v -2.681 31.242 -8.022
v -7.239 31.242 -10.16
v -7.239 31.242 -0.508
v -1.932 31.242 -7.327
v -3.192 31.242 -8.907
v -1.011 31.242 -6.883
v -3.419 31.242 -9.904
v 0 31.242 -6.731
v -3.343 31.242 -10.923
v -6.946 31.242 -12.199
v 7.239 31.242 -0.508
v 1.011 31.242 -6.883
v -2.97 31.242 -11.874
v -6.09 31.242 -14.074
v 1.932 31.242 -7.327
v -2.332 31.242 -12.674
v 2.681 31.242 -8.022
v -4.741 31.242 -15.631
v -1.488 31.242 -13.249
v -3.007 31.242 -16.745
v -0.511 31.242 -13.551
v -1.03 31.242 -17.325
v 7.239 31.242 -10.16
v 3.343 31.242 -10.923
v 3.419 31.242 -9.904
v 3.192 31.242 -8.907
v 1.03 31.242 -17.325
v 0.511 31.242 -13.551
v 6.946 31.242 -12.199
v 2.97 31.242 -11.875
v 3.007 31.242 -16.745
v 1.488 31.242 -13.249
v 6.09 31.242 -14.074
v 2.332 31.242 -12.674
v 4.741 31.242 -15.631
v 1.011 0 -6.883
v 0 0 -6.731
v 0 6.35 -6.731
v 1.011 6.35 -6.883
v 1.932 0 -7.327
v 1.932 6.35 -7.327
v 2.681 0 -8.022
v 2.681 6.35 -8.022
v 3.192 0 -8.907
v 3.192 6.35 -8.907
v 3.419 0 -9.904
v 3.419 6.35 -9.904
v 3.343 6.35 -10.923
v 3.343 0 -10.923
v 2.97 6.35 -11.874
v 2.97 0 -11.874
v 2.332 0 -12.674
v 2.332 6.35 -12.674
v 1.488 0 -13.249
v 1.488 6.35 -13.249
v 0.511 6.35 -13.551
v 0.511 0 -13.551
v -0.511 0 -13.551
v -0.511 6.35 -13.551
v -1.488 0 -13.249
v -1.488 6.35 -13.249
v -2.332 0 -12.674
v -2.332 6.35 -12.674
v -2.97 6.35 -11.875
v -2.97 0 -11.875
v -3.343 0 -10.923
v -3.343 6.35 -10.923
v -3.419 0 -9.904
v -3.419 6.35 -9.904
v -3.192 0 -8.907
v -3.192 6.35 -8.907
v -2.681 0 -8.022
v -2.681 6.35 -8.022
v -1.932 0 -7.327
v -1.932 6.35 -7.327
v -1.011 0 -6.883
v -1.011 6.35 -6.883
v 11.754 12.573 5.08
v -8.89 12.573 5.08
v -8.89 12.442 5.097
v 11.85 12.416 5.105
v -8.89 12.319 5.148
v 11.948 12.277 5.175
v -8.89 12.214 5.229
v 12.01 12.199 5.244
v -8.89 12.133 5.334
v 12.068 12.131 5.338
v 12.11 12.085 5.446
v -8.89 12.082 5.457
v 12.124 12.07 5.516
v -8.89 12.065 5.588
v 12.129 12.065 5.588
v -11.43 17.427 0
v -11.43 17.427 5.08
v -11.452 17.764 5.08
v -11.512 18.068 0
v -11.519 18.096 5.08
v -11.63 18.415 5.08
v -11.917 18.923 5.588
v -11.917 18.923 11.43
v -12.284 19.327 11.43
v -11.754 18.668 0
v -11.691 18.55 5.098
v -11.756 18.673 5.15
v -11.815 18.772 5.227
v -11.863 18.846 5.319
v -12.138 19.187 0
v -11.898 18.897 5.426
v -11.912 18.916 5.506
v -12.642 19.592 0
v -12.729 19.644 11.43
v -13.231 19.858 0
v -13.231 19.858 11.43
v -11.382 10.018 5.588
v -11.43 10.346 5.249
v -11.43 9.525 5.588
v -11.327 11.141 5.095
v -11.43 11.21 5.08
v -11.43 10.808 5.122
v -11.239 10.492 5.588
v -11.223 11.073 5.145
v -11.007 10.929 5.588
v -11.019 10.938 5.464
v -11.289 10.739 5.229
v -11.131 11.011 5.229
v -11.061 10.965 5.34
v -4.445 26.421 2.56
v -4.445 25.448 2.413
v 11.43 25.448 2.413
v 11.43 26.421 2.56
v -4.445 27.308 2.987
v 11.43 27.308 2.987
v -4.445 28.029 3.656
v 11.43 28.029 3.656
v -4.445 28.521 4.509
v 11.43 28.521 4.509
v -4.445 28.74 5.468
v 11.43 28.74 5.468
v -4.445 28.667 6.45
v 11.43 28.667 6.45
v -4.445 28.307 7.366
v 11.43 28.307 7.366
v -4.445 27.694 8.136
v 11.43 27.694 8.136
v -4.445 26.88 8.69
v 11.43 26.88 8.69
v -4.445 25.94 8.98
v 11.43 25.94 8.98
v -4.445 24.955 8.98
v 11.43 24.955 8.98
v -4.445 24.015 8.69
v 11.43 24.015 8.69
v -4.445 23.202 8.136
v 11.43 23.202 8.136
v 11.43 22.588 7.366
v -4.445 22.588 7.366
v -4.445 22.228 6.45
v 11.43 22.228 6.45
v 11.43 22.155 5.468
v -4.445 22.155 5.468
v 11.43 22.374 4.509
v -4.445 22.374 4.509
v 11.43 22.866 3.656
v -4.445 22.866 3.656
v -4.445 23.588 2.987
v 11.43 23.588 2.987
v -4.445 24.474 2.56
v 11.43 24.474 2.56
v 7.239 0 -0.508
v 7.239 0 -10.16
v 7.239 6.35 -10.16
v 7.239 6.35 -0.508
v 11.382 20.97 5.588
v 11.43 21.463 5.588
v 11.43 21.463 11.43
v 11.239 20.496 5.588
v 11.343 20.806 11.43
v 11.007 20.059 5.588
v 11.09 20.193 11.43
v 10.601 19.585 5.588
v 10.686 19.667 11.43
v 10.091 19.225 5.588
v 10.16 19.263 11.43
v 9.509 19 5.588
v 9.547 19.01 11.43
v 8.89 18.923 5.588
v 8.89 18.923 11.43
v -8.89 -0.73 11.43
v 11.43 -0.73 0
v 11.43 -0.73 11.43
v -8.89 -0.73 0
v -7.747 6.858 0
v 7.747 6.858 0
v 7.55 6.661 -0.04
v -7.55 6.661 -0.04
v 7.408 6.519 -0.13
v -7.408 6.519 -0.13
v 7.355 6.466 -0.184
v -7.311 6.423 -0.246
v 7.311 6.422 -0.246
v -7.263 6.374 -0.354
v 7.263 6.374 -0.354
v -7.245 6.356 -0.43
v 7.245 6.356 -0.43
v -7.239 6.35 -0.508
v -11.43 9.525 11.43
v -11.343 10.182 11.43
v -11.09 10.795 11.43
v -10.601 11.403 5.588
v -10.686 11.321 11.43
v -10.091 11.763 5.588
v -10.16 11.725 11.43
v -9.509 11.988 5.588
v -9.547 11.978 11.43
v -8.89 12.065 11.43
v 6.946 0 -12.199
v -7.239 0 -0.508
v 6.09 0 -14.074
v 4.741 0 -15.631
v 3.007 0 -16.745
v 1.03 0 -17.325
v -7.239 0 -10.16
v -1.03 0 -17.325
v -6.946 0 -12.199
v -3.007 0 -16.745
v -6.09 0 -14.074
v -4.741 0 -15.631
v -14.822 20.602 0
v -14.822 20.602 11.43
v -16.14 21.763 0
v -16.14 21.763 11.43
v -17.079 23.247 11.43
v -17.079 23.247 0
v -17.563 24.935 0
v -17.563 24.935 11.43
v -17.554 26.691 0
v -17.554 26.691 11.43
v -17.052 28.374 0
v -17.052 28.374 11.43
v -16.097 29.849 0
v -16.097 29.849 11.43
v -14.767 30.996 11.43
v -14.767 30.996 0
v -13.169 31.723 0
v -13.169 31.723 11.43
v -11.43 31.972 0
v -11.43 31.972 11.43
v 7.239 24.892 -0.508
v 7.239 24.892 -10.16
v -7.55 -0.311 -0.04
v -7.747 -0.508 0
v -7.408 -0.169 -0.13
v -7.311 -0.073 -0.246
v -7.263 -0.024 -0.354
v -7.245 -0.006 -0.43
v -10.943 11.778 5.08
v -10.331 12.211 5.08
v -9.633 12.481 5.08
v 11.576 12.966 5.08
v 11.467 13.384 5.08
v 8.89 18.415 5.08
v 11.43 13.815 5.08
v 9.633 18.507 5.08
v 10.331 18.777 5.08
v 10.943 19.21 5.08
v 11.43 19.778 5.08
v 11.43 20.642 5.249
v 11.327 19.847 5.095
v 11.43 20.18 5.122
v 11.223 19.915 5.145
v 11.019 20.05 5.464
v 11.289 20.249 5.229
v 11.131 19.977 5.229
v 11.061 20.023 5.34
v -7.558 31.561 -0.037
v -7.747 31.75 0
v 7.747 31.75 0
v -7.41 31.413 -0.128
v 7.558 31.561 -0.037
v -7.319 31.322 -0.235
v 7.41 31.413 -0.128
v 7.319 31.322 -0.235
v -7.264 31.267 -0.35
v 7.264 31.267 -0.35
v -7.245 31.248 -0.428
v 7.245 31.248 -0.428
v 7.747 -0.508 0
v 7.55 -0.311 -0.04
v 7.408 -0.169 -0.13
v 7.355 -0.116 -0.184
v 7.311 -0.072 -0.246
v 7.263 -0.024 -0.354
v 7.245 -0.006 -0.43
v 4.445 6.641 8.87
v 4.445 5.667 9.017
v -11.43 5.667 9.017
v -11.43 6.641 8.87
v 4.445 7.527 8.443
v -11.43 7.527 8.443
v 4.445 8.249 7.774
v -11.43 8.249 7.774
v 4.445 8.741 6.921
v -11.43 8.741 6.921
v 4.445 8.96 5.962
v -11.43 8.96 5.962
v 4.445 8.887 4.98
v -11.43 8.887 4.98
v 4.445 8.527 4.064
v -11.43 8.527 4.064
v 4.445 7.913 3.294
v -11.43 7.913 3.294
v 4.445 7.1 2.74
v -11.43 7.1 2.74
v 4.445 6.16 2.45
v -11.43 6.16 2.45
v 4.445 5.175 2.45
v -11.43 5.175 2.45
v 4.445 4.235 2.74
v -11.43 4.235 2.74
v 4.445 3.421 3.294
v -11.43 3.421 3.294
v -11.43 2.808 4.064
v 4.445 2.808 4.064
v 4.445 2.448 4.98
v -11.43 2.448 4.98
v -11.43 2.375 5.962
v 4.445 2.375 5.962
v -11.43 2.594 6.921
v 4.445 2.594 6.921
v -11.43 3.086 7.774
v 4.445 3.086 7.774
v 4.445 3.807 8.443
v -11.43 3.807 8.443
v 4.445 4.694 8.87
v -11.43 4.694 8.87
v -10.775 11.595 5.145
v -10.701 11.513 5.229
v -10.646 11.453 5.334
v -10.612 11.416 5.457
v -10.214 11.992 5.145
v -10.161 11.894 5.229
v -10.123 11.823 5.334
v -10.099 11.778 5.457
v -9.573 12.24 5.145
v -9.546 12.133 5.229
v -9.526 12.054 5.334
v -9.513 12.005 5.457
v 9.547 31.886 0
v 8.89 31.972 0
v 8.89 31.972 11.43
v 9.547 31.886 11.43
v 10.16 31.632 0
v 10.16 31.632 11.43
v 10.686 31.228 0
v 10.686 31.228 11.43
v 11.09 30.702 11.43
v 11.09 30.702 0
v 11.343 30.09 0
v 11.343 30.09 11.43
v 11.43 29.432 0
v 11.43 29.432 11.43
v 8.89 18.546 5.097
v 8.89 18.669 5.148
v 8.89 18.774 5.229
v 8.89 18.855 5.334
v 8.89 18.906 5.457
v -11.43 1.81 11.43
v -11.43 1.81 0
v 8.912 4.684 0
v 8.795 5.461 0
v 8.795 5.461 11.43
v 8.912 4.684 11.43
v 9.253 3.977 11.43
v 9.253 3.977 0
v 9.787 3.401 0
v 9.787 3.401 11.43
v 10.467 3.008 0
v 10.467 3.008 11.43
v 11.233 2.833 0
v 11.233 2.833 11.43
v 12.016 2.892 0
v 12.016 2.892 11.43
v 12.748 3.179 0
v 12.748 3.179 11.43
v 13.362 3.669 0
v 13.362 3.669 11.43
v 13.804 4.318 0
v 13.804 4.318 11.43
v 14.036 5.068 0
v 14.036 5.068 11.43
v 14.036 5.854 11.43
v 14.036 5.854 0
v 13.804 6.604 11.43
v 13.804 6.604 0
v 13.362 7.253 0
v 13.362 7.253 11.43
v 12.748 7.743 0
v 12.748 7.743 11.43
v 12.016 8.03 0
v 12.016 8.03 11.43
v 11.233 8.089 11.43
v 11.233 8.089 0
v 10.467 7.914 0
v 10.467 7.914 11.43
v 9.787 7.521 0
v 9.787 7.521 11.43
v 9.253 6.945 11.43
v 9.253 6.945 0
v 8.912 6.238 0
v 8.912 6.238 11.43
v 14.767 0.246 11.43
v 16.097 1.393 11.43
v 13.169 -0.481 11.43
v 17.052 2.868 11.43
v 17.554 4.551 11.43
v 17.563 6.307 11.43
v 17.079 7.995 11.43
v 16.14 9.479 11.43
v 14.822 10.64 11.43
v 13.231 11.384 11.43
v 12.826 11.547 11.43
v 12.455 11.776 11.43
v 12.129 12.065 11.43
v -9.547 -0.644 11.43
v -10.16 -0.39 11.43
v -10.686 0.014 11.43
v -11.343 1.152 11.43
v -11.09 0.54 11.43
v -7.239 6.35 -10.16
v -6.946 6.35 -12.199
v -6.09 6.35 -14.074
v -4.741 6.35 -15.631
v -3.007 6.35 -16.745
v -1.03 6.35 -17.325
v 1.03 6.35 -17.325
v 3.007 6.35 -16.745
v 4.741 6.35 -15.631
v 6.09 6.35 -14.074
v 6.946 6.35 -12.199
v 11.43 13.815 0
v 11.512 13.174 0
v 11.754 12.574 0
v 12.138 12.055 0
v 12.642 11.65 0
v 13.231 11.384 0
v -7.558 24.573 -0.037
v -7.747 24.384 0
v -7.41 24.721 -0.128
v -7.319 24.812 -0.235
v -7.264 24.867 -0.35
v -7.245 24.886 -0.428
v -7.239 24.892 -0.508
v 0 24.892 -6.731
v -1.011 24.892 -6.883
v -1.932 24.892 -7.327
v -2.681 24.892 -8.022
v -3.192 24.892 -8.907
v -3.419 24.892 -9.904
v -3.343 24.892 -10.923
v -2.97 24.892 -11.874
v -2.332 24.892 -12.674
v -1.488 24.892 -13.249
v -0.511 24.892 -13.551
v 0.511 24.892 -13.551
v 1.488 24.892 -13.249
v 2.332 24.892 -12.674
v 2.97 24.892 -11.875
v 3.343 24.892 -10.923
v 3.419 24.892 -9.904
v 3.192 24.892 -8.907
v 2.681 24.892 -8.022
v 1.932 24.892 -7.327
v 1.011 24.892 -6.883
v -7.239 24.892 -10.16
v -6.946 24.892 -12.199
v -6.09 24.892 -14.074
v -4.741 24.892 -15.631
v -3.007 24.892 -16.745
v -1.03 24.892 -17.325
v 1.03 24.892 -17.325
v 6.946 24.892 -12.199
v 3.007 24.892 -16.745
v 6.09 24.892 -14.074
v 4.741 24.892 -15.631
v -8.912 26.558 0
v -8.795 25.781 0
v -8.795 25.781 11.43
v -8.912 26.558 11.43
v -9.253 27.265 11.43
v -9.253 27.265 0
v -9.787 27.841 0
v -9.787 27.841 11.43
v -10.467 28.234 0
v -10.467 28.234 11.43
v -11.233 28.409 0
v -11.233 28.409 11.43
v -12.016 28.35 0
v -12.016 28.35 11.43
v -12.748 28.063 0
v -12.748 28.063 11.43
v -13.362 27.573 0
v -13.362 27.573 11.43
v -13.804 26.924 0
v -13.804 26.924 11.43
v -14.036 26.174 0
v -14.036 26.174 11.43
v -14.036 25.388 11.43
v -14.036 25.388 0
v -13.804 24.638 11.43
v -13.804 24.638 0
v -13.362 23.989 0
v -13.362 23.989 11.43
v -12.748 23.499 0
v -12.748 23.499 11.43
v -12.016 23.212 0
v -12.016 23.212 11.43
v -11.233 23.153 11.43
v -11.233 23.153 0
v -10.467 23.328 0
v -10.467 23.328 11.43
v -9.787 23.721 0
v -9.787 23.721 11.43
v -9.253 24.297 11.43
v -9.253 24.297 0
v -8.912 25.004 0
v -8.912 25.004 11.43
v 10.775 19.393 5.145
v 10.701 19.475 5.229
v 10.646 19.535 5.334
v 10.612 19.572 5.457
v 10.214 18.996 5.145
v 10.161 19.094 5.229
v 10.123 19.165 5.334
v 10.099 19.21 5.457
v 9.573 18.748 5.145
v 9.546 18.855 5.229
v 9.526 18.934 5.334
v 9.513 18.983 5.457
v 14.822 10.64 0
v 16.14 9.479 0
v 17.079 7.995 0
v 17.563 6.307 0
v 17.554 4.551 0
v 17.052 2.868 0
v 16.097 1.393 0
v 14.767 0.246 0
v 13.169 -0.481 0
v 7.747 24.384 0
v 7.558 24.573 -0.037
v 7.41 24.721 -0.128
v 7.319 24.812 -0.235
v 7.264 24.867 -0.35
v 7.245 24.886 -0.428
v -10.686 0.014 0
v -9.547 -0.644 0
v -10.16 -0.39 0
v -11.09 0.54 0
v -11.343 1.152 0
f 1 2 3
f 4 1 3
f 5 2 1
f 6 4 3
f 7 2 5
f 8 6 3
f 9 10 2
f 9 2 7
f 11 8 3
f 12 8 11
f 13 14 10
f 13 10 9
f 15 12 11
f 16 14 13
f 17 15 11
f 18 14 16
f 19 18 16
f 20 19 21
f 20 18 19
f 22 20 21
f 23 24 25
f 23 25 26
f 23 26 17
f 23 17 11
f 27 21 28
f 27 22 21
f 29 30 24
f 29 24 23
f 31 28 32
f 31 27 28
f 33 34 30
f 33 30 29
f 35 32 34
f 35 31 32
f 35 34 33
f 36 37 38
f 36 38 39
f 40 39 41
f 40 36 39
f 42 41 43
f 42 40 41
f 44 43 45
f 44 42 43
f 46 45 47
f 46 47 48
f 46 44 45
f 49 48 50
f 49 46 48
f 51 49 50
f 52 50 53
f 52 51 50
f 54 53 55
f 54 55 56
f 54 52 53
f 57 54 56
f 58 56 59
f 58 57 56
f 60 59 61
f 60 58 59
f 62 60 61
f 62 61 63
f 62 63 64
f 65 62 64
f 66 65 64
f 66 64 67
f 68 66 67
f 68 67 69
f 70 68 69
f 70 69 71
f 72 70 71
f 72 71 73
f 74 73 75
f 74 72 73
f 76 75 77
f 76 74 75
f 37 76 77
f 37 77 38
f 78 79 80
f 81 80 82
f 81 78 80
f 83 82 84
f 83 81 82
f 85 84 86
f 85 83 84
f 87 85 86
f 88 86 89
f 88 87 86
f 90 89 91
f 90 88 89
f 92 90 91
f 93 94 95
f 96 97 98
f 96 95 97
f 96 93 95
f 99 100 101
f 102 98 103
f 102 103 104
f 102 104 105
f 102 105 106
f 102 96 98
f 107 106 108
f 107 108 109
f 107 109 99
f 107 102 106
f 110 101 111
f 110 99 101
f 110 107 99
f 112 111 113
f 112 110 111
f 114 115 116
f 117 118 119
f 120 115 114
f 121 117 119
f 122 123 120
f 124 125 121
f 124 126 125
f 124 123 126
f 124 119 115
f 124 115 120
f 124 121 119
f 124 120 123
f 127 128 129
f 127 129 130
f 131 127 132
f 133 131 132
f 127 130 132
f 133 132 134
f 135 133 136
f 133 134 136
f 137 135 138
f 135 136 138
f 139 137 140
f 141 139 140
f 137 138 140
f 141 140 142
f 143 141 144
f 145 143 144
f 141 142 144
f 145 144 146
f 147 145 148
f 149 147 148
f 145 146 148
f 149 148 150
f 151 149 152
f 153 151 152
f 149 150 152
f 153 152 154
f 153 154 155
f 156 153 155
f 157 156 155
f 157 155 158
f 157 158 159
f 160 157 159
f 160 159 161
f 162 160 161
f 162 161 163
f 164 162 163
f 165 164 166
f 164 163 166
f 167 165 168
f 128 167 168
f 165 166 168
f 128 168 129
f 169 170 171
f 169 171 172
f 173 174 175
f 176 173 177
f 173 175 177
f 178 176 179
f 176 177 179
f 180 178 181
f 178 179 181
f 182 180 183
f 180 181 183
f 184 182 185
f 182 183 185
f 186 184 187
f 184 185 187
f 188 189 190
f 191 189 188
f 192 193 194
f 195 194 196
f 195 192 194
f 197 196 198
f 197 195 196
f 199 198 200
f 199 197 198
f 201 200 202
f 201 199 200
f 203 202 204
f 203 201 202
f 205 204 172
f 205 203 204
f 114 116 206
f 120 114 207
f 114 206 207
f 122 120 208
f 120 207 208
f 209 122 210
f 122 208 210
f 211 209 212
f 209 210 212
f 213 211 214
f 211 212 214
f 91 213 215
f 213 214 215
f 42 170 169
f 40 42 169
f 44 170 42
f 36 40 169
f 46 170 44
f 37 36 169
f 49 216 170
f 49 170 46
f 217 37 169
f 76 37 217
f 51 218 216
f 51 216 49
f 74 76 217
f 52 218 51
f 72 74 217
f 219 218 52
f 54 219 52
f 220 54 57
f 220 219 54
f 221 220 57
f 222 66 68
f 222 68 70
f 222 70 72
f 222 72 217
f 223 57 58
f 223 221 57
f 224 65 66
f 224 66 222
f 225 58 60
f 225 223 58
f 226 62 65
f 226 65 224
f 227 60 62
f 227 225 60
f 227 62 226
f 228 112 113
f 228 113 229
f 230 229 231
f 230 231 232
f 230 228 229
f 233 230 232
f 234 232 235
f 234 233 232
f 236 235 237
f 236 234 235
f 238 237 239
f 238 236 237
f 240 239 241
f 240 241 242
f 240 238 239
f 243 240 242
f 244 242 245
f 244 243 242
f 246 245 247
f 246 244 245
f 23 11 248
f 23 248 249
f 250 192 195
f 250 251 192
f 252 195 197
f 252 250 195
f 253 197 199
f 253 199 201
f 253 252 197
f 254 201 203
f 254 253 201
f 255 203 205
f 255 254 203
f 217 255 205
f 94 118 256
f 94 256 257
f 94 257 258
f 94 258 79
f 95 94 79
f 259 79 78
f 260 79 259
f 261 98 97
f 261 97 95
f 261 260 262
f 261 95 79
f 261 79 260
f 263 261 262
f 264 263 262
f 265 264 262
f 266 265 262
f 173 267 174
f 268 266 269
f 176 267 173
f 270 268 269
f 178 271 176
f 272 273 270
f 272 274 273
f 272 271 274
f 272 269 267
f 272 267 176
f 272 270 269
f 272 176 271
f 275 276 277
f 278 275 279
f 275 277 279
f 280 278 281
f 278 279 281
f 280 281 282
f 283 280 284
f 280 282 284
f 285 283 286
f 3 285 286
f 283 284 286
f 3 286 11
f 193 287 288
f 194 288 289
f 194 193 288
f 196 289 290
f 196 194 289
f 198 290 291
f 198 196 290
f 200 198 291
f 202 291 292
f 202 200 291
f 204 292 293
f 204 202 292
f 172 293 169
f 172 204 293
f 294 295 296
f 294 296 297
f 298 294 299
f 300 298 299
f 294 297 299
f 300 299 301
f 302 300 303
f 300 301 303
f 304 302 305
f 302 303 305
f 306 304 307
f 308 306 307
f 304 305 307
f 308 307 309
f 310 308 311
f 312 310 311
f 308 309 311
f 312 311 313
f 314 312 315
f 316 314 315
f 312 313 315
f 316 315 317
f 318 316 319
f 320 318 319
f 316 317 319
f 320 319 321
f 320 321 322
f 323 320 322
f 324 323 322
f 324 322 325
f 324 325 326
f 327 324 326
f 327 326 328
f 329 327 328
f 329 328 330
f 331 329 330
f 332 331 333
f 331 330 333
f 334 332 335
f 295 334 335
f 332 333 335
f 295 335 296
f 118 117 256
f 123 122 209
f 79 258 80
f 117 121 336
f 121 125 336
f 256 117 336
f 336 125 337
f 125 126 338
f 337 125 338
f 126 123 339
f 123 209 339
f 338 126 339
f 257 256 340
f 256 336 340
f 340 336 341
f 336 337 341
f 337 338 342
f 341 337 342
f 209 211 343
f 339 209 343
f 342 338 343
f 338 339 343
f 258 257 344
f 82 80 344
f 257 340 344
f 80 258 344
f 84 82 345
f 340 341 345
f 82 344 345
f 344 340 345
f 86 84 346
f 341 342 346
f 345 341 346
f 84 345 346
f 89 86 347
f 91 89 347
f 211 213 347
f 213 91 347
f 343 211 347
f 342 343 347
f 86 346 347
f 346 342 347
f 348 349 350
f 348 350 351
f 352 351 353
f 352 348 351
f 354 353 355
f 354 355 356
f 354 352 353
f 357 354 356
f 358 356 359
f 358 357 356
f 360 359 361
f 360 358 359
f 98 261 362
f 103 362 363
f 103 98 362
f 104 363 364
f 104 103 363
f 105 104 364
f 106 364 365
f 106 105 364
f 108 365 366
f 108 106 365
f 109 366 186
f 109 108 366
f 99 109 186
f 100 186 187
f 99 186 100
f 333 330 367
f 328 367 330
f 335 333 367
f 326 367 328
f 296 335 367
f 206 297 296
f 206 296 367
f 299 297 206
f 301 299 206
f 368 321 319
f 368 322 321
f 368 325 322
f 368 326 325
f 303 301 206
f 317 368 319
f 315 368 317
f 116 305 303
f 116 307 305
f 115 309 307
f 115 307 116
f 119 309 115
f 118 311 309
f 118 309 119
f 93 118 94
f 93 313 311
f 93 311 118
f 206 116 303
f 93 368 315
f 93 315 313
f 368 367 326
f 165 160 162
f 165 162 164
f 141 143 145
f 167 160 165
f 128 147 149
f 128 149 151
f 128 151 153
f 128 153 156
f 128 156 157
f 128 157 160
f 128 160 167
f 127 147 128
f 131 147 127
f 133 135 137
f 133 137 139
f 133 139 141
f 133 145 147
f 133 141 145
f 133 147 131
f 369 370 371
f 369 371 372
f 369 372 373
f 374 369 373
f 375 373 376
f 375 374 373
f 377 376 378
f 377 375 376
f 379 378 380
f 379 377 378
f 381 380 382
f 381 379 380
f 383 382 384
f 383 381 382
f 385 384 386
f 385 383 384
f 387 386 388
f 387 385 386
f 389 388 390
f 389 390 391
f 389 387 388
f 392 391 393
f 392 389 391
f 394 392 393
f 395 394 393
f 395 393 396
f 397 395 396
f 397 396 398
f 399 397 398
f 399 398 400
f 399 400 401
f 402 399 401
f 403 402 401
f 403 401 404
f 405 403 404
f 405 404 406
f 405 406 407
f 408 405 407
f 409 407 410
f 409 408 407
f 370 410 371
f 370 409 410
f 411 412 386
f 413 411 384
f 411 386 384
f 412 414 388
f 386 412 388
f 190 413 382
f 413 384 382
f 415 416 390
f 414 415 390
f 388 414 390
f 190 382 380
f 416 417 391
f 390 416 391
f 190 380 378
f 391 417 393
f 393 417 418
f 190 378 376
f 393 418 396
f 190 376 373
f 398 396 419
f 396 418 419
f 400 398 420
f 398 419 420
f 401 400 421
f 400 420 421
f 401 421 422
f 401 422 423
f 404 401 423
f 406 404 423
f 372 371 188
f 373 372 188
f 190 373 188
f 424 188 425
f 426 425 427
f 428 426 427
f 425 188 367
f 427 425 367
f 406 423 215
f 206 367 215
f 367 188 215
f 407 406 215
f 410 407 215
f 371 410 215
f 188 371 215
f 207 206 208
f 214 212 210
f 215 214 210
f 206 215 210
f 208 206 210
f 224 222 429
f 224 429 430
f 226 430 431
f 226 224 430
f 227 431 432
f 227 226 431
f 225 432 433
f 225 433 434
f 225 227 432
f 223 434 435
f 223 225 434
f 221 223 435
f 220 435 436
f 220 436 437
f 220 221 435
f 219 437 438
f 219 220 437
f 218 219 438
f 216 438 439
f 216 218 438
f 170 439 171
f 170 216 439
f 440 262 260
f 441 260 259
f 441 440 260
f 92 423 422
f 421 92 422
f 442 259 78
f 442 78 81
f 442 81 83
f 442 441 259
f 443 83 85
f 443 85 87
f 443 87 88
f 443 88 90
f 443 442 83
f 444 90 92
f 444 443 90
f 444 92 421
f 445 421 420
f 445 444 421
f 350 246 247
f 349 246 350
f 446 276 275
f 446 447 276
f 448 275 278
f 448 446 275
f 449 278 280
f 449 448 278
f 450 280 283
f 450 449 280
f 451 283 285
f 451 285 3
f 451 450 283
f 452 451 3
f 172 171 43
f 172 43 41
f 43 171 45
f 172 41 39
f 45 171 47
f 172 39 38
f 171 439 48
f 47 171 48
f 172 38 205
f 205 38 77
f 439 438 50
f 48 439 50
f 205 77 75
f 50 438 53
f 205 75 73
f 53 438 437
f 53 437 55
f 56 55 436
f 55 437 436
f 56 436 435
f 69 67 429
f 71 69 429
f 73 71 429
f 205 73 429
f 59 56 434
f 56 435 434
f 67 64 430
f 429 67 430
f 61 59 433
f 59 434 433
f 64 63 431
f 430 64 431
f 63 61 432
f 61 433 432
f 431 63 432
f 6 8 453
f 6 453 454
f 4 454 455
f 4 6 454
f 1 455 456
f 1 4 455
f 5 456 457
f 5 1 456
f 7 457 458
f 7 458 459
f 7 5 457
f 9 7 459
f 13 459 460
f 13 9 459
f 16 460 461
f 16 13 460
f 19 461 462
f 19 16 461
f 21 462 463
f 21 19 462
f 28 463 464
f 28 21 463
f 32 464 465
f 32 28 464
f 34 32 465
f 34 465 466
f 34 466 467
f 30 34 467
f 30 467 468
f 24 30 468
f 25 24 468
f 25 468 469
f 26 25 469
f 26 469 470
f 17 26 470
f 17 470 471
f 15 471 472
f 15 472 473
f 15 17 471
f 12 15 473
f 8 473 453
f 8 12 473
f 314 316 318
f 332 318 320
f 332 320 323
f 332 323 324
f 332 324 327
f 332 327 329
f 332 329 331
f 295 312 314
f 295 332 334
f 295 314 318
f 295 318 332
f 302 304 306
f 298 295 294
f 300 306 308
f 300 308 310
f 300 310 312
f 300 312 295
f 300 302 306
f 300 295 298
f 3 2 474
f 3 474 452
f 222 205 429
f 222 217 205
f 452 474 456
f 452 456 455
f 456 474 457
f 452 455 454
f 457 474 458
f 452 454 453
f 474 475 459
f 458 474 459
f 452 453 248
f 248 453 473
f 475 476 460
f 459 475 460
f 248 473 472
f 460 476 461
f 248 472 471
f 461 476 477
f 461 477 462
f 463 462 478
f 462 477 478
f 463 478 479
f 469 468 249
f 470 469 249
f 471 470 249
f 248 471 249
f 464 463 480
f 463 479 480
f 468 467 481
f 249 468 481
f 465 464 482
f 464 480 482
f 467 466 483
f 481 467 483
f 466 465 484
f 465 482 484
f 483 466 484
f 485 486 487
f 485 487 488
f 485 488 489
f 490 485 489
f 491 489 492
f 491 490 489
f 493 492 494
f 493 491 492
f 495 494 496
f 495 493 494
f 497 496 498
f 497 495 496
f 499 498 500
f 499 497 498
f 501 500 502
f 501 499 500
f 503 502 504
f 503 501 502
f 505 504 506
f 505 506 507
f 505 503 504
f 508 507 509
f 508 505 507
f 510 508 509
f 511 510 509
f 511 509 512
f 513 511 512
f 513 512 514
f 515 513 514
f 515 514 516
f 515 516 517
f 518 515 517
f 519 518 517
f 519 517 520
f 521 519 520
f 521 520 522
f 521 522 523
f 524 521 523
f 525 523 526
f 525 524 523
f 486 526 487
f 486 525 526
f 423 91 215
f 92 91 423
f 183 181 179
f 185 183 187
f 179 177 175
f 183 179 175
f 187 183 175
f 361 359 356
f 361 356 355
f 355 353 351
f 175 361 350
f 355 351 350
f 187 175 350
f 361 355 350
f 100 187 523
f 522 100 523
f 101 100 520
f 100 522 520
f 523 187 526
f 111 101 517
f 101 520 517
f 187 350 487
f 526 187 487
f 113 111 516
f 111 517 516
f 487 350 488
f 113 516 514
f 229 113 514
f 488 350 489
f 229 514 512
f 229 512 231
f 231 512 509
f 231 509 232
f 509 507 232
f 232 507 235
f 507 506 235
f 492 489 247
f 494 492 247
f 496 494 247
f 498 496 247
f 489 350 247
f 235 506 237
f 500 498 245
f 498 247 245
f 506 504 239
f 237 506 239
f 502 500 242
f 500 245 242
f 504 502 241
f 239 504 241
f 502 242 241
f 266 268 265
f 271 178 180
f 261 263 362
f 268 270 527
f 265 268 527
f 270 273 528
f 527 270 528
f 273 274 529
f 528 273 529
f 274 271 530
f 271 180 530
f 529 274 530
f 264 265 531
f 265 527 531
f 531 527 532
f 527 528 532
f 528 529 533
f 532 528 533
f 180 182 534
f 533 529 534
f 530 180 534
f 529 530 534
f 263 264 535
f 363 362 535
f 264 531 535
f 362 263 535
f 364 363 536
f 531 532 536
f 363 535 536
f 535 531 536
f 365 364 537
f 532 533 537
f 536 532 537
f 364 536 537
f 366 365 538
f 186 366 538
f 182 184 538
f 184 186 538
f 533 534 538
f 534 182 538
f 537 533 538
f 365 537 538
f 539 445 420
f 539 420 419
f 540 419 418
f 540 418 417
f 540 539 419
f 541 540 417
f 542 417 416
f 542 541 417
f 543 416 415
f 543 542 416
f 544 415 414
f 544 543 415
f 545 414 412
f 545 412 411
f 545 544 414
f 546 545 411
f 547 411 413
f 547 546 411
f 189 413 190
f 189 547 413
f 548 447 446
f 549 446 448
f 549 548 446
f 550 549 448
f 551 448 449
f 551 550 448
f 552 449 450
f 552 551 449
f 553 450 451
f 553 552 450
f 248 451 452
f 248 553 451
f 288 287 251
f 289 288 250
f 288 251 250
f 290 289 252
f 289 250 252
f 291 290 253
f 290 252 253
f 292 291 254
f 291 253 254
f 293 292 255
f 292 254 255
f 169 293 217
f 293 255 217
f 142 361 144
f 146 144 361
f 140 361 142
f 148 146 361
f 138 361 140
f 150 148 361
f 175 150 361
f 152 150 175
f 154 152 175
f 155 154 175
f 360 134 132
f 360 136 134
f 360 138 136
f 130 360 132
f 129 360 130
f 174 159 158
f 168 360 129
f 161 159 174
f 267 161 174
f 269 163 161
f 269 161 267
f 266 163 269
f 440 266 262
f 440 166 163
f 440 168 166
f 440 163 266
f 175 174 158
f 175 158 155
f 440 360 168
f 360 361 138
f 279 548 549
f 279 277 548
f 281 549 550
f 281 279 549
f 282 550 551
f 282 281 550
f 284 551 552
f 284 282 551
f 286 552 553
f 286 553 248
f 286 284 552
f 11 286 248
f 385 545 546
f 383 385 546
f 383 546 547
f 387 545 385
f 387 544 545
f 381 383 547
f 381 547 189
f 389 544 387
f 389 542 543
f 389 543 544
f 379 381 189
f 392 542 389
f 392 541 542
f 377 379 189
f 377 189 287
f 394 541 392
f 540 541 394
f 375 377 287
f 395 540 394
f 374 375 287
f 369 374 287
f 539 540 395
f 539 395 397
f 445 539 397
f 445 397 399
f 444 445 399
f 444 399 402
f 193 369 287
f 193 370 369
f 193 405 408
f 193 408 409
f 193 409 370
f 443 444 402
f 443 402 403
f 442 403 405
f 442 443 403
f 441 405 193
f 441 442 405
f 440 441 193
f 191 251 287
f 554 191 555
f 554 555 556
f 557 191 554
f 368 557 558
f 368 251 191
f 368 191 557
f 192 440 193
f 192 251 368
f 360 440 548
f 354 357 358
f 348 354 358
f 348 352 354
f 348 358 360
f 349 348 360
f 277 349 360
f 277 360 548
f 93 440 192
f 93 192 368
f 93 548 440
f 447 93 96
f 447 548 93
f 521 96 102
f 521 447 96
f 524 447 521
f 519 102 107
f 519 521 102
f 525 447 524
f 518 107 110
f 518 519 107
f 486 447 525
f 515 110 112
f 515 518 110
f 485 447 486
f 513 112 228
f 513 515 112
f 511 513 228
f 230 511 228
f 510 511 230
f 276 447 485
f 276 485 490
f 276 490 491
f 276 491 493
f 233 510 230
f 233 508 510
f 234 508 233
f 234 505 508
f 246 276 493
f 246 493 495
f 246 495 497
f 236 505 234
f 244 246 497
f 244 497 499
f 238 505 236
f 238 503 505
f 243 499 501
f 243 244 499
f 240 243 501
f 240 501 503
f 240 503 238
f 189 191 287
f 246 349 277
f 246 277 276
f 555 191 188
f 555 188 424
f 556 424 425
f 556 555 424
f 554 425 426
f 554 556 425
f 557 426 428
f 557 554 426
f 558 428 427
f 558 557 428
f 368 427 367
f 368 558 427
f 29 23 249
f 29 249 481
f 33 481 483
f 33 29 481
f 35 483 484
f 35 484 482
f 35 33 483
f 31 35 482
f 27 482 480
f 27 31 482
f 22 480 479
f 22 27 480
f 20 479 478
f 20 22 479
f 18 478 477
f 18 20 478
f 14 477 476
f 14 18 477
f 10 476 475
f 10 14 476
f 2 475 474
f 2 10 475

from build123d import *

# Parameters (mm, degrees)
SKETCH2_R           = 3.429
BOSS_EXTRUDE1_DEPTH = 6.35
SKETCH6_R           = 3.429
BOSS_EXTRUDE2_DEPTH = 6.35
SKETCH7_R           = 2.63525
BOSS_EXTRUDE3_DEPTH = 11.43
CUT_EXTRUDE2_START  = -6.35
CUT_EXTRUDE2_DEPTH  = 6.35
FILLET2_R           = 2.54
FILLET3_R           = 0.508
SKETCH12_R          = 3.302
CUT_EXTRUDE3_DEPTH  = 15.875
SKETCH13_R          = 3.302
CUT_EXTRUDE4_DEPTH  = 15.875


with BuildPart() as part:
    # Sketch2 → Boss-Extrude1 (new body)
    with BuildSketch(Plane(origin=(0, 0, 0), x_dir=(1, 0, 0), z_dir=(0, 1, 0))):
        with BuildLine():
            Line((-7.239, 0), (-7.239, 10.16))
            ThreePointArc((-7.239, 10.16), (0, 17.399), (7.239, 10.16))
            Line((7.239, 10.16), (7.239, 0))
            Line((7.239, 0), (-7.239, 0))
        make_face()
        with Locations(Location((0, 10.16, 0), (0, 0, 270))):
            Circle(SKETCH2_R, mode=Mode.SUBTRACT)
    extrude(amount=BOSS_EXTRUDE1_DEPTH)



with BuildPart() as body_2:
    # Sketch6 → Boss-Extrude2 (new body)
    with BuildSketch(Plane(origin=(0, 31.242, 0), x_dir=(-1, 0, 0), z_dir=(0, -1, 0))):
        with BuildLine():
            Line((7.239, 0), (-7.239, 0))
            Line((-7.239, 0), (-7.239, 10.16))
            ThreePointArc((-7.239, 10.16), (0, 17.399), (7.239, 10.16))
            Line((7.239, 10.16), (7.239, 0))
        make_face()
        with Locations(Location((0, 10.16, 0), (0, 0, 270))):
            Circle(SKETCH6_R, mode=Mode.SUBTRACT)
    extrude(amount=BOSS_EXTRUDE2_DEPTH)


with BuildPart() as part_1:
    add(part.part)

    add(body_2.part)  # Boss-Extrude3 merges body 2
    # Sketch7 → Boss-Extrude3 (add)
    with BuildSketch(Plane.XY):
        with BuildLine():
            Line((11.43, -0.73025), (-8.89, -0.73025))
            ThreePointArc((-8.89, -0.73025), (-10.686051224, 0.013698776), (-11.43, 1.80975))
            Line((-11.43, 1.80975), (-11.43, 17.427370456))
            ThreePointArc((-11.43, 17.427370456), (-11.929359281, 18.939780934), (-13.231090909, 19.857517232))
            ThreePointArc((-13.231090909, 19.857517232), (-17.553942327, 26.691443265), (-11.43, 31.97225))
            Line((-11.43, 31.97225), (8.89, 31.97225))
            ThreePointArc((8.89, 31.97225), (10.686051224, 31.228301224), (11.43, 29.43225))
            Line((11.43, 29.43225), (11.43, 13.814629544))
            ThreePointArc((11.43, 13.814629544), (11.929359281, 12.302219066), (13.231090909, 11.384482768))
            ThreePointArc((13.231090909, 11.384482768), (17.553942327, 4.550556735), (11.43, -0.73025))
        make_face()
        with Locations((-11.43, 25.781)):
            Circle(SKETCH7_R, mode=Mode.SUBTRACT)
        with Locations(Location((11.43, 5.461, 0), (0, 0, 180))):
            Circle(SKETCH7_R, mode=Mode.SUBTRACT)
    extrude(amount=BOSS_EXTRUDE3_DEPTH)

    # Sketch11 → Cut-Extrude2 (cut)
    with BuildSketch(Plane.XY.offset(11.43).offset(CUT_EXTRUDE2_START)):
        with BuildLine():
            Line((11.43, 18.923), (-11.91702843, 18.923))
            ThreePointArc((-11.91702843, 18.923), (-11.554824252, 18.213834763), (-11.43, 17.427370456))
            Line((-11.43, 17.427370456), (-11.43, 12.065))
            Line((-11.43, 12.065), (12.128697076, 12.065))
            ThreePointArc((12.128697076, 12.065), (11.611132748, 12.872639477), (11.43, 13.814629544))
            Line((11.43, 13.814629544), (11.43, 18.923))
        make_face()
    extrude(amount=CUT_EXTRUDE2_DEPTH, mode=Mode.SUBTRACT)

    # Fillet2
    fillet2_edges = [part_1.edges().sort_by_distance(p)[0] for p in [
        (11.43, 18.923, 8.255),
        (-11.43, 12.065, 8.255),
    ]]
    fillet(fillet2_edges, radius=FILLET2_R)

    # Fillet3
    fillet3_edges = [part_1.edges().sort_by_distance(p)[0] for p in [
        (-10.686051224, 11.321051224, 5.08),
        (1.619348538, 12.065, 5.08),
    ]]
    fillet(fillet3_edges, radius=FILLET3_R)
    fillet3_2_edges = [part_1.edges().sort_by_distance(p)[0] for p in [
        (-1.513514215, 18.923, 5.08),
        (10.686051224, 19.666948776, 5.08),
    ]]
    fillet(fillet3_2_edges, radius=FILLET3_R)
    fillet3_3_edges = [part_1.edges().sort_by_distance(p)[0] for p in [
        (0, 0, 0),
    ]]
    fillet(fillet3_3_edges, radius=FILLET3_R)
    fillet3_4_edges = [part_1.edges().sort_by_distance(p)[0] for p in [
        (0, 6.35, 0),
    ]]
    fillet(fillet3_4_edges, radius=FILLET3_R)
    fillet3_5_edges = [part_1.edges().sort_by_distance(p)[0] for p in [
        (0, 31.242, 0),
    ]]
    fillet(fillet3_5_edges, radius=FILLET3_R)
    fillet3_6_edges = [part_1.edges().sort_by_distance(p)[0] for p in [
        (0, 24.892, 0),
    ]]
    fillet(fillet3_6_edges, radius=FILLET3_R)
    fillet3_7_edges = [part_1.edges().sort_by_distance(p)[0] for p in [
        (7.239, 28.067, 0),
    ]]
    fillet(fillet3_7_edges, radius=FILLET3_R)
    fillet3_8_edges = [part_1.edges().sort_by_distance(p)[0] for p in [
        (-7.239, 28.067, 0),
    ]]
    fillet(fillet3_8_edges, radius=FILLET3_R)
    fillet3_9_edges = [part_1.edges().sort_by_distance(p)[0] for p in [
        (7.239, 3.175, 0),
    ]]
    fillet(fillet3_9_edges, radius=FILLET3_R - 0.0001)  # a hair under: the kernel refuses the full size
    fillet3_10_edges = [part_1.edges().sort_by_distance(p)[0] for p in [
        (-7.239, 3.175, 0),
    ]]
    fillet(fillet3_10_edges, radius=FILLET3_R - 0.0001)  # a hair under: the kernel refuses the full size

    # Sketch12 → Cut-Extrude3 (cut)
    with BuildSketch(Plane(origin=(11.43, 0, 0), x_dir=(0, 0, -1), z_dir=(1, 0, 0))):
        with Locations((-5.715, 25.447625)):
            Circle(SKETCH12_R)
    extrude(amount=-CUT_EXTRUDE3_DEPTH, mode=Mode.SUBTRACT)

    # Sketch13 → Cut-Extrude4 (cut)
    with BuildSketch(Plane.ZY.offset(11.43)):
        with Locations((5.715, 5.667375)):
            Circle(SKETCH13_R)
    extrude(amount=-CUT_EXTRUDE4_DEPTH, mode=Mode.SUBTRACT)


solid = part_1.part
